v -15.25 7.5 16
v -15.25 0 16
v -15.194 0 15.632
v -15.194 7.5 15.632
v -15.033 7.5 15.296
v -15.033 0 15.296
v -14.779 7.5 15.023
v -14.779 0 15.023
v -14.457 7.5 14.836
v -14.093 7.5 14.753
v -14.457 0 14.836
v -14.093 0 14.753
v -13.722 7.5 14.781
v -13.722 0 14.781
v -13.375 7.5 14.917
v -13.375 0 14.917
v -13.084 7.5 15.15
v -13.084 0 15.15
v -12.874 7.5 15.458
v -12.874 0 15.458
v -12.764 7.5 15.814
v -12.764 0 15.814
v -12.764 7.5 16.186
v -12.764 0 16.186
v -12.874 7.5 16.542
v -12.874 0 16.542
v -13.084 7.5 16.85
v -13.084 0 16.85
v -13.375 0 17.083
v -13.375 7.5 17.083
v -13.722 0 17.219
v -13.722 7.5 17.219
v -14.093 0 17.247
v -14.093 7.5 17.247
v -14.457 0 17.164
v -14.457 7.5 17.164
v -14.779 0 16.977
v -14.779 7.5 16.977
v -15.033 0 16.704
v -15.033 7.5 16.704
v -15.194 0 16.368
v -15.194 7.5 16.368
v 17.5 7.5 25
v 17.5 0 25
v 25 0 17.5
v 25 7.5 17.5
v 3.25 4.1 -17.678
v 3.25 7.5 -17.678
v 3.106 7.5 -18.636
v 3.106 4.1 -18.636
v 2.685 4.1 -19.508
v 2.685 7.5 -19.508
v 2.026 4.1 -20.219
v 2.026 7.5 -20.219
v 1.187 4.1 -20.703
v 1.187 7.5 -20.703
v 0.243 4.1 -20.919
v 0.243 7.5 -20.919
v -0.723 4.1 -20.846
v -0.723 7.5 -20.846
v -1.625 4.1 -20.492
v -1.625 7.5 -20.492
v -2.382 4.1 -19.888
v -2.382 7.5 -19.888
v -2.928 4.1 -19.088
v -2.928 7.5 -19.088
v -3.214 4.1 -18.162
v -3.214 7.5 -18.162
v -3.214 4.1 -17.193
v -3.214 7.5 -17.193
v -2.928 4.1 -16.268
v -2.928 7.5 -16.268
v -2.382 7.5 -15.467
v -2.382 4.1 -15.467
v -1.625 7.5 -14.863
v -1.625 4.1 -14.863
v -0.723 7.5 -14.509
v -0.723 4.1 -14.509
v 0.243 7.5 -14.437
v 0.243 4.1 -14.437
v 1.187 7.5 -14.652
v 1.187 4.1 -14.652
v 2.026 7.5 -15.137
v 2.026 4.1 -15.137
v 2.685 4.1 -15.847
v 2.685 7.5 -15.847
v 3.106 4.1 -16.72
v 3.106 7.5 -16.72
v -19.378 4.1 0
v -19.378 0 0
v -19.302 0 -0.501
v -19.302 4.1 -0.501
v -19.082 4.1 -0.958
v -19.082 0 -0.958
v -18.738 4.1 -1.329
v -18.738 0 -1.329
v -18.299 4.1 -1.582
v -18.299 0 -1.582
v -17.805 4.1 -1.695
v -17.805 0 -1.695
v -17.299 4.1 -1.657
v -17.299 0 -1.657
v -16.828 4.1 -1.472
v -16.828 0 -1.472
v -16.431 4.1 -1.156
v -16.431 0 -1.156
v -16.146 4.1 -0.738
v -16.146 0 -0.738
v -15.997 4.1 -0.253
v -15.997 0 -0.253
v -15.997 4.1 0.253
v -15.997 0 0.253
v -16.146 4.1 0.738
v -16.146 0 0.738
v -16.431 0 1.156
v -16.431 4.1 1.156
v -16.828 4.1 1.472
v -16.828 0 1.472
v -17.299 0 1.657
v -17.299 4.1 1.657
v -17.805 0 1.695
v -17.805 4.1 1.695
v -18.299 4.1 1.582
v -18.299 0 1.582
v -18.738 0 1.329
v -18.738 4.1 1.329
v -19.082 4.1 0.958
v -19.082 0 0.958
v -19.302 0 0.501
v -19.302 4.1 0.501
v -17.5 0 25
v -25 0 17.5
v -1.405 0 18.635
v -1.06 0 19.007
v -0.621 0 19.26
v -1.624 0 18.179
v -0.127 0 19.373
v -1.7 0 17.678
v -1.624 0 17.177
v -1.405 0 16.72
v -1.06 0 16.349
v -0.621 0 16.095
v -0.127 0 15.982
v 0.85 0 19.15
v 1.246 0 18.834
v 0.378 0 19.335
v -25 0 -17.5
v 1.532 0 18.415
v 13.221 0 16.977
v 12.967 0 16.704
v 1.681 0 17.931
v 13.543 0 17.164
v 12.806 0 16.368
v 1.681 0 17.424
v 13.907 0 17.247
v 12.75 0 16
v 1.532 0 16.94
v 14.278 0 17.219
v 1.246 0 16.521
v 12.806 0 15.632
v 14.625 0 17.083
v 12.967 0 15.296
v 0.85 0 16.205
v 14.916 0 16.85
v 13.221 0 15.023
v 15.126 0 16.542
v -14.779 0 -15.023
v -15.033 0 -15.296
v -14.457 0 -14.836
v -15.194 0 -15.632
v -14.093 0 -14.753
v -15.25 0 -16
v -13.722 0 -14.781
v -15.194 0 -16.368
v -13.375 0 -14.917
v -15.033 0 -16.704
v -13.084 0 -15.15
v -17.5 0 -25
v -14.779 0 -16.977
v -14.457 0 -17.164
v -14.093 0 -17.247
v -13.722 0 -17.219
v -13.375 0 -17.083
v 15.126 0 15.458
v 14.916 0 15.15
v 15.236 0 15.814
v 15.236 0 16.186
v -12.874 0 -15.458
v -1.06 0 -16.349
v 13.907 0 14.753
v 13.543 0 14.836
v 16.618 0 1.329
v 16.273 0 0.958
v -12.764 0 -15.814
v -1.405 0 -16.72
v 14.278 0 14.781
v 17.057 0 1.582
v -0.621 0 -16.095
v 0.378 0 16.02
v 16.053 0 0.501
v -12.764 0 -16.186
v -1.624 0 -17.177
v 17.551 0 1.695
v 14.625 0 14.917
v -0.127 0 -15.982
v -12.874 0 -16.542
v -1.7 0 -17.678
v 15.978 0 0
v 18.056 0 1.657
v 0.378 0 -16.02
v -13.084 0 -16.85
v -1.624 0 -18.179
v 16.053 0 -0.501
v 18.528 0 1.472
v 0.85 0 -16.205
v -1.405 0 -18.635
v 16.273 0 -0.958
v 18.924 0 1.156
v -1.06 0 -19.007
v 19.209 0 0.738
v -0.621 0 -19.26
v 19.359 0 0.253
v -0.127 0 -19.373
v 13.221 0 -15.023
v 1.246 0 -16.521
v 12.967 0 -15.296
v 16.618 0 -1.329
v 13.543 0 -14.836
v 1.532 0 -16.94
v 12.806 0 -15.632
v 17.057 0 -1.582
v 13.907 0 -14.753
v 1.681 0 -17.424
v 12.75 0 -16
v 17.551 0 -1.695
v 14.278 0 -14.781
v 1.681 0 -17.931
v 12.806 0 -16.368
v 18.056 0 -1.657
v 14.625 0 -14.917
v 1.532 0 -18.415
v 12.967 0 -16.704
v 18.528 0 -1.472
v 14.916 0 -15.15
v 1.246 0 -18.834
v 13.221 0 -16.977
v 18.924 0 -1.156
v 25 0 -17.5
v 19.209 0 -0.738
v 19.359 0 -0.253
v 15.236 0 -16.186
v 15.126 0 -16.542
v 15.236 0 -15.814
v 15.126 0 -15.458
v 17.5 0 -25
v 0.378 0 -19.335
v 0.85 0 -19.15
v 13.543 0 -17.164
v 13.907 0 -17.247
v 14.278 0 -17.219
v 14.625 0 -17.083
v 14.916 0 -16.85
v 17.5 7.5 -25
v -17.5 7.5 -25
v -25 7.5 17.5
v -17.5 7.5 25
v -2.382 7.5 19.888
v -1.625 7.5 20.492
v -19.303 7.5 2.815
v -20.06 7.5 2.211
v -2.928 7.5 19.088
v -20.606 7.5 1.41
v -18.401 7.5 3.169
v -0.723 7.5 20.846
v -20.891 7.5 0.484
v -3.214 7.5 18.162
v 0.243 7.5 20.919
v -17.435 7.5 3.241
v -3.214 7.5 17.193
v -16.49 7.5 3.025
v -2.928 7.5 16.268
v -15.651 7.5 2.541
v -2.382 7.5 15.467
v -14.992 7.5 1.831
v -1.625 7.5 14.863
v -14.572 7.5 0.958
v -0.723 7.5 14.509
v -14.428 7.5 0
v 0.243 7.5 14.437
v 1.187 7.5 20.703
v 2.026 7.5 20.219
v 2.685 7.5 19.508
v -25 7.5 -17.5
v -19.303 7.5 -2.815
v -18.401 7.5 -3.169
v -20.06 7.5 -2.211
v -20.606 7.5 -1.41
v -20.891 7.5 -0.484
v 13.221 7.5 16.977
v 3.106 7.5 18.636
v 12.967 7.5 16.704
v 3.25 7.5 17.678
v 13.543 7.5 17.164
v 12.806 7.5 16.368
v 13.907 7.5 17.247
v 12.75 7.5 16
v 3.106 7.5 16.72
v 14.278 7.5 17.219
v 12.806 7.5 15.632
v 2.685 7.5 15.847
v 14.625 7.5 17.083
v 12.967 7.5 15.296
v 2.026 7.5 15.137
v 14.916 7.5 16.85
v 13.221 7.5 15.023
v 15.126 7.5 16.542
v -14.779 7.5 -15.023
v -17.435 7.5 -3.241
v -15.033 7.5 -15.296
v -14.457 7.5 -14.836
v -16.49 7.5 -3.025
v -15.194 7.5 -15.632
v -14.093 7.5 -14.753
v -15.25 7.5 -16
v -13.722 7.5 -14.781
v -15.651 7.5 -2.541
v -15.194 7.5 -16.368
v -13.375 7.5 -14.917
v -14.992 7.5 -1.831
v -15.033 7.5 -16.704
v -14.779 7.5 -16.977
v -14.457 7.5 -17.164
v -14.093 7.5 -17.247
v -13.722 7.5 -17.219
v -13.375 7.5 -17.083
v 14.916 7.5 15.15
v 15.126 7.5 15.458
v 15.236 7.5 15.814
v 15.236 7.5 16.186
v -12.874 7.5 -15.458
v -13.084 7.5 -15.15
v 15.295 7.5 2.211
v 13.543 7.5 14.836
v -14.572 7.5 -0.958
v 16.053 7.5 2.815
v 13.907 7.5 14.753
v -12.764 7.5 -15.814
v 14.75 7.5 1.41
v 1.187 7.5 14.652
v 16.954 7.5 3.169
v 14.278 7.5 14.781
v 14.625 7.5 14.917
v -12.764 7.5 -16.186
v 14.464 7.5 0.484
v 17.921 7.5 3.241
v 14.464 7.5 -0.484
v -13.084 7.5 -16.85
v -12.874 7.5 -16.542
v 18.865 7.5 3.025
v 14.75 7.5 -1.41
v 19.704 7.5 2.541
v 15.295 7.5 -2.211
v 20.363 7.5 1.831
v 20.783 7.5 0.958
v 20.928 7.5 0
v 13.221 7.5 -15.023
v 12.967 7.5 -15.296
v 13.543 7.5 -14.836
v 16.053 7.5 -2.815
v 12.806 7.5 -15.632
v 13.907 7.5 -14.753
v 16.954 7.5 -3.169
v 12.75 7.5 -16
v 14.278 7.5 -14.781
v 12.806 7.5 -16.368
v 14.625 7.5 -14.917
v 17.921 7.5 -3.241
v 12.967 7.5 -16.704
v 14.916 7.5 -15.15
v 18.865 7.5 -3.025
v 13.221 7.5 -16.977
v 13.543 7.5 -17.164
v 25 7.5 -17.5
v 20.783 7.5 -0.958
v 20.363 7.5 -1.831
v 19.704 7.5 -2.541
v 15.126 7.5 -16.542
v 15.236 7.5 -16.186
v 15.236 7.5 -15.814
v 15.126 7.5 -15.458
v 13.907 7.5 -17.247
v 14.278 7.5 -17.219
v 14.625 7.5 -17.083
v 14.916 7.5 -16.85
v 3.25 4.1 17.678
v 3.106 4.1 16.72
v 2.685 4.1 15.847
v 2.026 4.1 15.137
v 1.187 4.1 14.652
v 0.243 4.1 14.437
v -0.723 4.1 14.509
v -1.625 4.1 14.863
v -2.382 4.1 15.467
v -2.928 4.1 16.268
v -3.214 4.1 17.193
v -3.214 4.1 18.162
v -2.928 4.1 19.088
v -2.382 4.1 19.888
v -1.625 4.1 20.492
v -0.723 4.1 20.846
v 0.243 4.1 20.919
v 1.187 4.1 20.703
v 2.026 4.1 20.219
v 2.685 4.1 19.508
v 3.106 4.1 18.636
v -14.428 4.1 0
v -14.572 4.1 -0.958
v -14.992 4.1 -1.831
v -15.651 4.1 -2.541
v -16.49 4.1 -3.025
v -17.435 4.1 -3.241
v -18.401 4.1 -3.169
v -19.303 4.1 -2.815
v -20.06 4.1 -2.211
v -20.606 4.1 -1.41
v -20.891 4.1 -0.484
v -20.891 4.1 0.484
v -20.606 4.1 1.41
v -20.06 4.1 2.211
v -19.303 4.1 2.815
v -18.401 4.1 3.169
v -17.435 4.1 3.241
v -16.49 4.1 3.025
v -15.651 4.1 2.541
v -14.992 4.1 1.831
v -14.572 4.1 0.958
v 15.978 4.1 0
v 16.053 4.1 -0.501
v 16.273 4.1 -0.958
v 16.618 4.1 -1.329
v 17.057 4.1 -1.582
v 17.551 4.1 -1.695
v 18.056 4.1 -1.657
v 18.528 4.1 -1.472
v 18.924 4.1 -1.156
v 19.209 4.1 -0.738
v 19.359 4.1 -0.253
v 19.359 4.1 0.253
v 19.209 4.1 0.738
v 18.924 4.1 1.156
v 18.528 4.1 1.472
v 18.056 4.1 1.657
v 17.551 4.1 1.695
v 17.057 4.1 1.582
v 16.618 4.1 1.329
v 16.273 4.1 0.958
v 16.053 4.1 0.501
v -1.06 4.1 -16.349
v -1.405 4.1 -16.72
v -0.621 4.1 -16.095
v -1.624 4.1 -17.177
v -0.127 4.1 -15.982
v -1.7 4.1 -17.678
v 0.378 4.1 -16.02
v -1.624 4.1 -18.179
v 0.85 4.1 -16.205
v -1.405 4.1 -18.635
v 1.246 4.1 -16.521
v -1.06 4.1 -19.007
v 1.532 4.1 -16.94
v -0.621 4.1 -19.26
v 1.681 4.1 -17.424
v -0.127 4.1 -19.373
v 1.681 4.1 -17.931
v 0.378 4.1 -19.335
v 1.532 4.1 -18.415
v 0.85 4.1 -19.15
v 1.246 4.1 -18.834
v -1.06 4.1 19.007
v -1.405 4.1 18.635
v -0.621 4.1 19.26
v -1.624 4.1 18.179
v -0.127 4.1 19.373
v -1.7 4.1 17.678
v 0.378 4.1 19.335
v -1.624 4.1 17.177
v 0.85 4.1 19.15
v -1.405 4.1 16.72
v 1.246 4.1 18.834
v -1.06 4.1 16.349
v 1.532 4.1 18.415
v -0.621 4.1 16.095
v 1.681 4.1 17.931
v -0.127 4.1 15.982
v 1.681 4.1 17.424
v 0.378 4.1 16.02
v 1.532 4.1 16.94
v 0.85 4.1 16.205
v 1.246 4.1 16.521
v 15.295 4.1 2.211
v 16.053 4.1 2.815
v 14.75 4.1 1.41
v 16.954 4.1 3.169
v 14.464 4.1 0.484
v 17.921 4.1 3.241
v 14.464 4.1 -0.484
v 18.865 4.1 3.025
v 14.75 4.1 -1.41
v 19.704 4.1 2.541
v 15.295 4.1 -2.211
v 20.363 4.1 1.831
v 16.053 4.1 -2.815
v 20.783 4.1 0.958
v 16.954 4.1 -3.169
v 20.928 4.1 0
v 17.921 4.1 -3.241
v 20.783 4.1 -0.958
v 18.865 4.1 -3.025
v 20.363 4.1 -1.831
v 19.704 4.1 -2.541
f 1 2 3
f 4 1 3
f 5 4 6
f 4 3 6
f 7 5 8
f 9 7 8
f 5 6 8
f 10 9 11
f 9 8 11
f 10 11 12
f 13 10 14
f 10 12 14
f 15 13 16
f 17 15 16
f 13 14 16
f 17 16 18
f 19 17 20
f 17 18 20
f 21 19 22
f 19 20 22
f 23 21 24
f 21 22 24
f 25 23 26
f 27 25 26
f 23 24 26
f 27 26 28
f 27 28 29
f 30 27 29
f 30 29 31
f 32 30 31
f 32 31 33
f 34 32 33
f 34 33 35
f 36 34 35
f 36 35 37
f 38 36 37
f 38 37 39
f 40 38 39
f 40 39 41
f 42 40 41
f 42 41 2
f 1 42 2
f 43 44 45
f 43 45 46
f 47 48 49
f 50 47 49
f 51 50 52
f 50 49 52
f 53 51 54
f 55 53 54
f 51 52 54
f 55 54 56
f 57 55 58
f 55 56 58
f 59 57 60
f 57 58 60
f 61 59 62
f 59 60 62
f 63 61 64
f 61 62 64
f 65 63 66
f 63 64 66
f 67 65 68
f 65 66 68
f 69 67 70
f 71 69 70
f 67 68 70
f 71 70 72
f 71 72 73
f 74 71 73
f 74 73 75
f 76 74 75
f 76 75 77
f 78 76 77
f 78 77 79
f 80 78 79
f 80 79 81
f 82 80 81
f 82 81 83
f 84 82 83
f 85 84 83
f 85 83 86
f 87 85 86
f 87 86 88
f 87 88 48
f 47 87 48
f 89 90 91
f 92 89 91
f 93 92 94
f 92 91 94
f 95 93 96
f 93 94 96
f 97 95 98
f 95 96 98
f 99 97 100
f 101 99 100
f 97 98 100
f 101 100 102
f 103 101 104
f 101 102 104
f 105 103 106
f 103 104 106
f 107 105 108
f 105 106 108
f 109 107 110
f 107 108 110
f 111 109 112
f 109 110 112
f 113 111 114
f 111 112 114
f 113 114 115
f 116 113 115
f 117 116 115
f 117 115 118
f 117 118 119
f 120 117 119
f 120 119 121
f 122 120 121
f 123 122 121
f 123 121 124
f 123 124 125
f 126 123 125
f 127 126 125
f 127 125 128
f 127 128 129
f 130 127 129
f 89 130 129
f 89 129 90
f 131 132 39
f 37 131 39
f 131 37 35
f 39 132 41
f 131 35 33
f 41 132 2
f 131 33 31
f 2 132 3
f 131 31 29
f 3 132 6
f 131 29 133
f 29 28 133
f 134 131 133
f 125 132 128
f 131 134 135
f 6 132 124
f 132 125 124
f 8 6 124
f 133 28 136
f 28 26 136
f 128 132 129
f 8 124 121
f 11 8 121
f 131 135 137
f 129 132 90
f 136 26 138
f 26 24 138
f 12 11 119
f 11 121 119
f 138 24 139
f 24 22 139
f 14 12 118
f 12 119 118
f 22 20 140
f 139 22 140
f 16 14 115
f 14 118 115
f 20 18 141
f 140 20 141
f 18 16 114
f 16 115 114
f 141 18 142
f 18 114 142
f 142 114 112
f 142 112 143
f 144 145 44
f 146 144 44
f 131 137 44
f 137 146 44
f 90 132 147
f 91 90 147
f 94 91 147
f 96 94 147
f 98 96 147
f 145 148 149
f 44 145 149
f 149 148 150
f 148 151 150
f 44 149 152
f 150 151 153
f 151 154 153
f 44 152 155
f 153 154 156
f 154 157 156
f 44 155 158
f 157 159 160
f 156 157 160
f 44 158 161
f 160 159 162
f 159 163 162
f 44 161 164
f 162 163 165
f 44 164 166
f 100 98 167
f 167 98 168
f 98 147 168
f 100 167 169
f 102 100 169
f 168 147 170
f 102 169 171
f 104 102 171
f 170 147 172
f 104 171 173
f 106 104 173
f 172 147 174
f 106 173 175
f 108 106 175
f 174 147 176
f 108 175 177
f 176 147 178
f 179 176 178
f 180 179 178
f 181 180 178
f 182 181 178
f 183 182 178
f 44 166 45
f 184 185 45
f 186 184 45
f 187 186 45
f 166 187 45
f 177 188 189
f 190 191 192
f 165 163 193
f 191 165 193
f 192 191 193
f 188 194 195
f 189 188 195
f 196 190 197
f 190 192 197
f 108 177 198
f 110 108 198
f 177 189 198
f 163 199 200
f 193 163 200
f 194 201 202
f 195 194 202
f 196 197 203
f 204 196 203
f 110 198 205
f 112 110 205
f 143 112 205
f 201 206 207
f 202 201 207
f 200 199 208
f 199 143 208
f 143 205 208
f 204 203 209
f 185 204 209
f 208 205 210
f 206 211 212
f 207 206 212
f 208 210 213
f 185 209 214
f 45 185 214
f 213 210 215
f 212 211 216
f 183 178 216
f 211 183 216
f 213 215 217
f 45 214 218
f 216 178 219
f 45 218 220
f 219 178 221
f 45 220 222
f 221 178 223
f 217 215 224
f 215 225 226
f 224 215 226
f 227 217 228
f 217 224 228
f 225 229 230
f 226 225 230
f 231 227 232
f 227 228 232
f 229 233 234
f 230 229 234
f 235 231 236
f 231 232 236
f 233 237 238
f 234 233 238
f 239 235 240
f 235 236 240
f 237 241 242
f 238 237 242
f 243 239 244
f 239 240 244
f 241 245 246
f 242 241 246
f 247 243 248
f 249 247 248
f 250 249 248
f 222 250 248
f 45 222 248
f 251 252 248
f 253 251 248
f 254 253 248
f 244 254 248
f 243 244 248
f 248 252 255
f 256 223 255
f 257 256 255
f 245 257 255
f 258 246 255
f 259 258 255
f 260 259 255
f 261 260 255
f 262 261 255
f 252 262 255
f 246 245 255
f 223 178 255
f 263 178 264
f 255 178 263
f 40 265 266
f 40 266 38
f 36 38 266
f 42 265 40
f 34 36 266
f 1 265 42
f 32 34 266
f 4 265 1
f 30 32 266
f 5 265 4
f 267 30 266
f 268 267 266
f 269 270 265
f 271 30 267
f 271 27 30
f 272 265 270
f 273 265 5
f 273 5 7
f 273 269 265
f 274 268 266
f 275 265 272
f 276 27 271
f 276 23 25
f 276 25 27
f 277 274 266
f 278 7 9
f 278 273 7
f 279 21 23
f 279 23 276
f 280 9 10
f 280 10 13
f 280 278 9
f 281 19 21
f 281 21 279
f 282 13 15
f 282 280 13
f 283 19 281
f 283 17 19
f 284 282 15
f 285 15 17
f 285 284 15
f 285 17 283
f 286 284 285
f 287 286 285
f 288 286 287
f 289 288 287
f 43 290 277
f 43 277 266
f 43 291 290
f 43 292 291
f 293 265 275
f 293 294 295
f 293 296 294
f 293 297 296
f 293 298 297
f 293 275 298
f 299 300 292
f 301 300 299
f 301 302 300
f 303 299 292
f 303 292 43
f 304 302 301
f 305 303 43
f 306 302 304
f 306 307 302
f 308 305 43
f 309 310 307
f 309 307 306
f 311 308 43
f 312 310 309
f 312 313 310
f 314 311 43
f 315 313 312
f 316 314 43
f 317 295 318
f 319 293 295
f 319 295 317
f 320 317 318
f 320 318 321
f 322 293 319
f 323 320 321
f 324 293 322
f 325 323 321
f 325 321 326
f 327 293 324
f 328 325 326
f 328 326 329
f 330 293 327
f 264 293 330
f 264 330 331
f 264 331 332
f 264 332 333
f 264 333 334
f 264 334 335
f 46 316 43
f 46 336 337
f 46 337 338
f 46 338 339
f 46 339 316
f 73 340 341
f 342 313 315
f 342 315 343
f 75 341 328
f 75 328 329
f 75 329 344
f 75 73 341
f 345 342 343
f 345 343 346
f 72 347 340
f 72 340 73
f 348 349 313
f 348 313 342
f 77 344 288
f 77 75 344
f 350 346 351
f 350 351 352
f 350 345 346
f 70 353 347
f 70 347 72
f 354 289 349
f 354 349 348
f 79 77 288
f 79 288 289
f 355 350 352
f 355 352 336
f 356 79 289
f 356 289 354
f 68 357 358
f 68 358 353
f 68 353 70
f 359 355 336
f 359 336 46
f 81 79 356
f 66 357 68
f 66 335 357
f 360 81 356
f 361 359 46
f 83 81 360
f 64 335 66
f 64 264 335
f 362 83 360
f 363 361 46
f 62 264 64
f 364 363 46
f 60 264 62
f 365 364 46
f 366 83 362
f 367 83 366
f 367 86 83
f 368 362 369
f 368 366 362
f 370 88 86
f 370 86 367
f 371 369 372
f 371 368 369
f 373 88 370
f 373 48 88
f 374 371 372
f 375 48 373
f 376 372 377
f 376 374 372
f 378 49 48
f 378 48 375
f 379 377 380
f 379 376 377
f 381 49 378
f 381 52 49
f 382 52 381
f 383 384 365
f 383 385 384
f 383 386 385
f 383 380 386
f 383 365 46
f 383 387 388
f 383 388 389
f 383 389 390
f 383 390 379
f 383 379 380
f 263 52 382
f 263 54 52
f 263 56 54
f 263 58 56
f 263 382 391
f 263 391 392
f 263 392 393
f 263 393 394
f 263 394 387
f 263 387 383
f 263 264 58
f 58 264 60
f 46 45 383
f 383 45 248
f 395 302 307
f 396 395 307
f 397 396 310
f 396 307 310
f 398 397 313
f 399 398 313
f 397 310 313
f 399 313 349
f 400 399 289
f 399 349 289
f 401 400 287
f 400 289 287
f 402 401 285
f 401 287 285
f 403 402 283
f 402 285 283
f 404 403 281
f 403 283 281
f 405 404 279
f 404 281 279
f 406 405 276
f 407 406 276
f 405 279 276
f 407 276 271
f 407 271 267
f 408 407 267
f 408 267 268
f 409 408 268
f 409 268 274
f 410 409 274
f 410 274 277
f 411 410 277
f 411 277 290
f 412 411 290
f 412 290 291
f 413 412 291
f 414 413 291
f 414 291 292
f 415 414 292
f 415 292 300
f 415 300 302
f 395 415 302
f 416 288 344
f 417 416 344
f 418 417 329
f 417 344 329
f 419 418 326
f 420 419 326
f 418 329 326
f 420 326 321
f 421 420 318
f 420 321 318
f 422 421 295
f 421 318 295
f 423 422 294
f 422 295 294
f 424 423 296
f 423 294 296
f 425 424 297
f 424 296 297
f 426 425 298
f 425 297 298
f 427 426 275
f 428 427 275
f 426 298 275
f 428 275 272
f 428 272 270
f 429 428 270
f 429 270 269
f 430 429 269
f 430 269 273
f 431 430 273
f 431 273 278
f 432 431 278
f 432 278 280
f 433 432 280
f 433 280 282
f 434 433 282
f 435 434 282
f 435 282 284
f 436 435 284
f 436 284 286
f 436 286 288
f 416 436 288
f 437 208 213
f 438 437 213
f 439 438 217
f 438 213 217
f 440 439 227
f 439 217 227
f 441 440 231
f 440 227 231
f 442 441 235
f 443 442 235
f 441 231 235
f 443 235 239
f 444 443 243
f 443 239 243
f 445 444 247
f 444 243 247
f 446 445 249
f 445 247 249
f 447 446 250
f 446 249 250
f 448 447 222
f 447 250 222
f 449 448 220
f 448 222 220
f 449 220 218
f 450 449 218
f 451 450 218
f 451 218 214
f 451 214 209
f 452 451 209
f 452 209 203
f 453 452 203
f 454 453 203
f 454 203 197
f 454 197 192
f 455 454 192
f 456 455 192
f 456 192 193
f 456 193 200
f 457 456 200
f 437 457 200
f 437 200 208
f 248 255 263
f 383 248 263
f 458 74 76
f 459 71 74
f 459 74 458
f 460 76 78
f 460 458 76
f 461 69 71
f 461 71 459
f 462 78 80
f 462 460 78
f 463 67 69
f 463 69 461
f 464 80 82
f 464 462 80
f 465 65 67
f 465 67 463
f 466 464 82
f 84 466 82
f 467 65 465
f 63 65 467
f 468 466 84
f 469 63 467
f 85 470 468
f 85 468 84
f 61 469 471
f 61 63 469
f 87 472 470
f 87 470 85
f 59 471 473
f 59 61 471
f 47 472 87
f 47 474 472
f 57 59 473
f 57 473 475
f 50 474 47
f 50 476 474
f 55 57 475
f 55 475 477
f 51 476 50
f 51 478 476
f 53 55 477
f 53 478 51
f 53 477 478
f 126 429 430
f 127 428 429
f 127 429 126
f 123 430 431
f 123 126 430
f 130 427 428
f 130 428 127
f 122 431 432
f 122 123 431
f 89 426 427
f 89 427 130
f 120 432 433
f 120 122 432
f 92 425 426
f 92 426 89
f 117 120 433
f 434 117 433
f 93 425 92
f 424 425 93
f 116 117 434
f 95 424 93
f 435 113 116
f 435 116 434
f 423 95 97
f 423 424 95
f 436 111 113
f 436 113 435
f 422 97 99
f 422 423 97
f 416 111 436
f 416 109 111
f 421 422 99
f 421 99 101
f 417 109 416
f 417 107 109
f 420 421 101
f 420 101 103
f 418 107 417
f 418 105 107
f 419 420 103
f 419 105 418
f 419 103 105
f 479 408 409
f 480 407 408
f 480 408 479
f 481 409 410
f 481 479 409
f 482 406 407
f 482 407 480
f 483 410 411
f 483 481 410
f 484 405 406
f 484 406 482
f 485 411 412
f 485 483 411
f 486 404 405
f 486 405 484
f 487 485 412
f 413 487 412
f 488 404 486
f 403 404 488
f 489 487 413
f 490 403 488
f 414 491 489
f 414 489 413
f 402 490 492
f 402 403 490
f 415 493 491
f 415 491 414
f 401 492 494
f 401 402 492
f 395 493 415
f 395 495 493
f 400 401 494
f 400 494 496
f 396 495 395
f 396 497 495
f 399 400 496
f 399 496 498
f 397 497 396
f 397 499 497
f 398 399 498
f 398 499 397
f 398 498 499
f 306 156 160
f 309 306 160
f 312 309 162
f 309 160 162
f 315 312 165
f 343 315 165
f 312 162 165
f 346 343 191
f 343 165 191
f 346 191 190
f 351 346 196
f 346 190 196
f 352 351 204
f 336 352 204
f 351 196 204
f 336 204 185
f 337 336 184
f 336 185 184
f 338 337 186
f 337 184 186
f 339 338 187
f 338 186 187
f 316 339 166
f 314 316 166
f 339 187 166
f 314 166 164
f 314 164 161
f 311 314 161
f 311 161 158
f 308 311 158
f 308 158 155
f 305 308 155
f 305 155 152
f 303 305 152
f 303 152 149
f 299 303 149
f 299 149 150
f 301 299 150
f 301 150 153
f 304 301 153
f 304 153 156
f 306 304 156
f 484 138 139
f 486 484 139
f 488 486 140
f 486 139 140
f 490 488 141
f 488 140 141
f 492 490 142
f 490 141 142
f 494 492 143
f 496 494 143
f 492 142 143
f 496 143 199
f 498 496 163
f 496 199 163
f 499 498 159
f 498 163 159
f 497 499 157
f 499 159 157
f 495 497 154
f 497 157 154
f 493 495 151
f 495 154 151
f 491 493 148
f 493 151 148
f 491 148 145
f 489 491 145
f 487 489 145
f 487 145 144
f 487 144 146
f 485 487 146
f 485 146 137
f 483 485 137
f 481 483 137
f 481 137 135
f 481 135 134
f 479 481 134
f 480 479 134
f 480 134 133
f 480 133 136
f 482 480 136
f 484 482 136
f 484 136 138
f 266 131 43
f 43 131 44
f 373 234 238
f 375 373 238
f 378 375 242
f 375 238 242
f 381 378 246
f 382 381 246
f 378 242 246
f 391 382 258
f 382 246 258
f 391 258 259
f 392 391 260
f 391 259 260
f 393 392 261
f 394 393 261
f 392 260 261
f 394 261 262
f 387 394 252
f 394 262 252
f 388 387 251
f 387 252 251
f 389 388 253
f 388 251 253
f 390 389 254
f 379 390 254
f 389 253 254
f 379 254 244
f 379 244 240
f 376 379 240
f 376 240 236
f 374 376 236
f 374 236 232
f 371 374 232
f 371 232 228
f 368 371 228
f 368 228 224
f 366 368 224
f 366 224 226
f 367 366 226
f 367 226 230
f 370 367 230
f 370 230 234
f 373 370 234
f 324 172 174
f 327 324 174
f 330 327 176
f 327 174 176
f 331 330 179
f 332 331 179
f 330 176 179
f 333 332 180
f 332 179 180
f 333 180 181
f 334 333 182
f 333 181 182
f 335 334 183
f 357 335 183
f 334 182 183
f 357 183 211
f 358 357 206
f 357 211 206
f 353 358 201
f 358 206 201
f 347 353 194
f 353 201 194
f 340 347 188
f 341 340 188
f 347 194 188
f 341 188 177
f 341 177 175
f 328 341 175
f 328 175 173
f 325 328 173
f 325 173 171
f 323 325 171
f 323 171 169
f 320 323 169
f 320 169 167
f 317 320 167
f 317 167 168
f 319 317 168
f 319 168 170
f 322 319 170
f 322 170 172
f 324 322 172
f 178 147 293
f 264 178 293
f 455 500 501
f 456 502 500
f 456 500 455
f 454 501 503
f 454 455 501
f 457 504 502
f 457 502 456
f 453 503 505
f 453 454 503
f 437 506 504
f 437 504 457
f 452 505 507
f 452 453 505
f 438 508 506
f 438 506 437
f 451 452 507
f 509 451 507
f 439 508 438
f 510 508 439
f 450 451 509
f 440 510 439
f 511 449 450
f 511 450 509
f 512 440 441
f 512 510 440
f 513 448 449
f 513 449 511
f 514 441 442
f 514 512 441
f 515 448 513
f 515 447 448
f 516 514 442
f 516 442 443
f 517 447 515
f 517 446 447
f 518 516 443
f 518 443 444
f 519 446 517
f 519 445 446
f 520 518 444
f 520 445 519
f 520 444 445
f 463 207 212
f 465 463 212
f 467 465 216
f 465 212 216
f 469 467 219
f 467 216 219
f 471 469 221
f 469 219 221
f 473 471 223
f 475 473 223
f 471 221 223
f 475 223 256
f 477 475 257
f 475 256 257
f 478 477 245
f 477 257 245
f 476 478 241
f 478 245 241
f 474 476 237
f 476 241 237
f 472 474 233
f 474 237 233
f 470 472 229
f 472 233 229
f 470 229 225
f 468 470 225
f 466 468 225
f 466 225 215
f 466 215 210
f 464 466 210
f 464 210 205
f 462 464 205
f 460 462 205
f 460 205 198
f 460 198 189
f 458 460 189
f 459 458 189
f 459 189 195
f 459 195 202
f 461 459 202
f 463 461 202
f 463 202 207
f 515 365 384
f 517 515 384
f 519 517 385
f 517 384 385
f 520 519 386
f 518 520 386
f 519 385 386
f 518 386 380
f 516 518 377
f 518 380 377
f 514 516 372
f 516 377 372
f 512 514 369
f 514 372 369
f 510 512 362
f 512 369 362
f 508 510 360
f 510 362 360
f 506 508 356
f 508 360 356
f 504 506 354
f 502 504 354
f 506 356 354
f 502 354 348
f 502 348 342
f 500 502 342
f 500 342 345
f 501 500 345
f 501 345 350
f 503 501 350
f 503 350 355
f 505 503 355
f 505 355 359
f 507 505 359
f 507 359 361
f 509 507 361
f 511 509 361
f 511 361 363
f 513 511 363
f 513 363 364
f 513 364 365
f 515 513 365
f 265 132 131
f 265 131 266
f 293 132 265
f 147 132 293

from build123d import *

# Parameters (mm, degrees)
SKETCH1_W                                           = 50
SKETCH1_H                                           = 50
BOSS_EXTRUDE1_DEPTH                                 = 7.5
M3_TAPPED_HOLE1_D                                   = 2.5
M3_TAPPED_HOLE1_DEPTH                               = 7.5
CBORE_FOR_M3_HEX_SOCKET_HEAD_CAP_SCREW1_D           = 3.4
CBORE_FOR_M3_HEX_SOCKET_HEAD_CAP_SCREW1_DEPTH       = 7.5
CBORE_FOR_M3_HEX_SOCKET_HEAD_CAP_SCREW1_CBORE_D     = 6.5
CBORE_FOR_M3_HEX_SOCKET_HEAD_CAP_SCREW1_CBORE_DEPTH = 3.4
CHAMFER1_SIZE                                       = 7.5


with BuildPart() as part:
    # Sketch1 → Boss-Extrude1 (new body)
    with BuildSketch(Plane(origin=(0, 0, 0), x_dir=(1, 0, 0), z_dir=(0, 1, 0))):
        Rectangle(SKETCH1_W, SKETCH1_H)
    extrude(amount=BOSS_EXTRUDE1_DEPTH)

    # M3 Tapped Hole1
    with Locations(Plane(origin=(0, 7.5, 0), x_dir=(1, 0, 0), z_dir=(0, 1, 0))):
        with Locations((-14, -16), (-14, 16), (14, 16), (14, -16)):
            Hole(M3_TAPPED_HOLE1_D / 2, depth=M3_TAPPED_HOLE1_DEPTH)

    # CBORE for M3 Hex Socket Head Cap Screw1
    with Locations(Plane(origin=(0, 7.5, 0), x_dir=(1, 0, 0), z_dir=(0, 1, 0))):
        with Locations((0, 17.67766953), (-17.67766953, 0), (17.67766953, 0), (0, -17.67766953)):
            CounterBoreHole(CBORE_FOR_M3_HEX_SOCKET_HEAD_CAP_SCREW1_D / 2, CBORE_FOR_M3_HEX_SOCKET_HEAD_CAP_SCREW1_CBORE_D / 2, CBORE_FOR_M3_HEX_SOCKET_HEAD_CAP_SCREW1_CBORE_DEPTH, depth=CBORE_FOR_M3_HEX_SOCKET_HEAD_CAP_SCREW1_DEPTH)

    # Chamfer1
    chamfer1_edges = [part.edges().sort_by_distance(p)[0] for p in [
        (25, 3.75, 25),
        (-25, 3.75, 25),
        (-25, 3.75, -25),
        (25, 3.75, -25),
    ]]
    chamfer(chamfer1_edges, length=CHAMFER1_SIZE)


solid = part.part
